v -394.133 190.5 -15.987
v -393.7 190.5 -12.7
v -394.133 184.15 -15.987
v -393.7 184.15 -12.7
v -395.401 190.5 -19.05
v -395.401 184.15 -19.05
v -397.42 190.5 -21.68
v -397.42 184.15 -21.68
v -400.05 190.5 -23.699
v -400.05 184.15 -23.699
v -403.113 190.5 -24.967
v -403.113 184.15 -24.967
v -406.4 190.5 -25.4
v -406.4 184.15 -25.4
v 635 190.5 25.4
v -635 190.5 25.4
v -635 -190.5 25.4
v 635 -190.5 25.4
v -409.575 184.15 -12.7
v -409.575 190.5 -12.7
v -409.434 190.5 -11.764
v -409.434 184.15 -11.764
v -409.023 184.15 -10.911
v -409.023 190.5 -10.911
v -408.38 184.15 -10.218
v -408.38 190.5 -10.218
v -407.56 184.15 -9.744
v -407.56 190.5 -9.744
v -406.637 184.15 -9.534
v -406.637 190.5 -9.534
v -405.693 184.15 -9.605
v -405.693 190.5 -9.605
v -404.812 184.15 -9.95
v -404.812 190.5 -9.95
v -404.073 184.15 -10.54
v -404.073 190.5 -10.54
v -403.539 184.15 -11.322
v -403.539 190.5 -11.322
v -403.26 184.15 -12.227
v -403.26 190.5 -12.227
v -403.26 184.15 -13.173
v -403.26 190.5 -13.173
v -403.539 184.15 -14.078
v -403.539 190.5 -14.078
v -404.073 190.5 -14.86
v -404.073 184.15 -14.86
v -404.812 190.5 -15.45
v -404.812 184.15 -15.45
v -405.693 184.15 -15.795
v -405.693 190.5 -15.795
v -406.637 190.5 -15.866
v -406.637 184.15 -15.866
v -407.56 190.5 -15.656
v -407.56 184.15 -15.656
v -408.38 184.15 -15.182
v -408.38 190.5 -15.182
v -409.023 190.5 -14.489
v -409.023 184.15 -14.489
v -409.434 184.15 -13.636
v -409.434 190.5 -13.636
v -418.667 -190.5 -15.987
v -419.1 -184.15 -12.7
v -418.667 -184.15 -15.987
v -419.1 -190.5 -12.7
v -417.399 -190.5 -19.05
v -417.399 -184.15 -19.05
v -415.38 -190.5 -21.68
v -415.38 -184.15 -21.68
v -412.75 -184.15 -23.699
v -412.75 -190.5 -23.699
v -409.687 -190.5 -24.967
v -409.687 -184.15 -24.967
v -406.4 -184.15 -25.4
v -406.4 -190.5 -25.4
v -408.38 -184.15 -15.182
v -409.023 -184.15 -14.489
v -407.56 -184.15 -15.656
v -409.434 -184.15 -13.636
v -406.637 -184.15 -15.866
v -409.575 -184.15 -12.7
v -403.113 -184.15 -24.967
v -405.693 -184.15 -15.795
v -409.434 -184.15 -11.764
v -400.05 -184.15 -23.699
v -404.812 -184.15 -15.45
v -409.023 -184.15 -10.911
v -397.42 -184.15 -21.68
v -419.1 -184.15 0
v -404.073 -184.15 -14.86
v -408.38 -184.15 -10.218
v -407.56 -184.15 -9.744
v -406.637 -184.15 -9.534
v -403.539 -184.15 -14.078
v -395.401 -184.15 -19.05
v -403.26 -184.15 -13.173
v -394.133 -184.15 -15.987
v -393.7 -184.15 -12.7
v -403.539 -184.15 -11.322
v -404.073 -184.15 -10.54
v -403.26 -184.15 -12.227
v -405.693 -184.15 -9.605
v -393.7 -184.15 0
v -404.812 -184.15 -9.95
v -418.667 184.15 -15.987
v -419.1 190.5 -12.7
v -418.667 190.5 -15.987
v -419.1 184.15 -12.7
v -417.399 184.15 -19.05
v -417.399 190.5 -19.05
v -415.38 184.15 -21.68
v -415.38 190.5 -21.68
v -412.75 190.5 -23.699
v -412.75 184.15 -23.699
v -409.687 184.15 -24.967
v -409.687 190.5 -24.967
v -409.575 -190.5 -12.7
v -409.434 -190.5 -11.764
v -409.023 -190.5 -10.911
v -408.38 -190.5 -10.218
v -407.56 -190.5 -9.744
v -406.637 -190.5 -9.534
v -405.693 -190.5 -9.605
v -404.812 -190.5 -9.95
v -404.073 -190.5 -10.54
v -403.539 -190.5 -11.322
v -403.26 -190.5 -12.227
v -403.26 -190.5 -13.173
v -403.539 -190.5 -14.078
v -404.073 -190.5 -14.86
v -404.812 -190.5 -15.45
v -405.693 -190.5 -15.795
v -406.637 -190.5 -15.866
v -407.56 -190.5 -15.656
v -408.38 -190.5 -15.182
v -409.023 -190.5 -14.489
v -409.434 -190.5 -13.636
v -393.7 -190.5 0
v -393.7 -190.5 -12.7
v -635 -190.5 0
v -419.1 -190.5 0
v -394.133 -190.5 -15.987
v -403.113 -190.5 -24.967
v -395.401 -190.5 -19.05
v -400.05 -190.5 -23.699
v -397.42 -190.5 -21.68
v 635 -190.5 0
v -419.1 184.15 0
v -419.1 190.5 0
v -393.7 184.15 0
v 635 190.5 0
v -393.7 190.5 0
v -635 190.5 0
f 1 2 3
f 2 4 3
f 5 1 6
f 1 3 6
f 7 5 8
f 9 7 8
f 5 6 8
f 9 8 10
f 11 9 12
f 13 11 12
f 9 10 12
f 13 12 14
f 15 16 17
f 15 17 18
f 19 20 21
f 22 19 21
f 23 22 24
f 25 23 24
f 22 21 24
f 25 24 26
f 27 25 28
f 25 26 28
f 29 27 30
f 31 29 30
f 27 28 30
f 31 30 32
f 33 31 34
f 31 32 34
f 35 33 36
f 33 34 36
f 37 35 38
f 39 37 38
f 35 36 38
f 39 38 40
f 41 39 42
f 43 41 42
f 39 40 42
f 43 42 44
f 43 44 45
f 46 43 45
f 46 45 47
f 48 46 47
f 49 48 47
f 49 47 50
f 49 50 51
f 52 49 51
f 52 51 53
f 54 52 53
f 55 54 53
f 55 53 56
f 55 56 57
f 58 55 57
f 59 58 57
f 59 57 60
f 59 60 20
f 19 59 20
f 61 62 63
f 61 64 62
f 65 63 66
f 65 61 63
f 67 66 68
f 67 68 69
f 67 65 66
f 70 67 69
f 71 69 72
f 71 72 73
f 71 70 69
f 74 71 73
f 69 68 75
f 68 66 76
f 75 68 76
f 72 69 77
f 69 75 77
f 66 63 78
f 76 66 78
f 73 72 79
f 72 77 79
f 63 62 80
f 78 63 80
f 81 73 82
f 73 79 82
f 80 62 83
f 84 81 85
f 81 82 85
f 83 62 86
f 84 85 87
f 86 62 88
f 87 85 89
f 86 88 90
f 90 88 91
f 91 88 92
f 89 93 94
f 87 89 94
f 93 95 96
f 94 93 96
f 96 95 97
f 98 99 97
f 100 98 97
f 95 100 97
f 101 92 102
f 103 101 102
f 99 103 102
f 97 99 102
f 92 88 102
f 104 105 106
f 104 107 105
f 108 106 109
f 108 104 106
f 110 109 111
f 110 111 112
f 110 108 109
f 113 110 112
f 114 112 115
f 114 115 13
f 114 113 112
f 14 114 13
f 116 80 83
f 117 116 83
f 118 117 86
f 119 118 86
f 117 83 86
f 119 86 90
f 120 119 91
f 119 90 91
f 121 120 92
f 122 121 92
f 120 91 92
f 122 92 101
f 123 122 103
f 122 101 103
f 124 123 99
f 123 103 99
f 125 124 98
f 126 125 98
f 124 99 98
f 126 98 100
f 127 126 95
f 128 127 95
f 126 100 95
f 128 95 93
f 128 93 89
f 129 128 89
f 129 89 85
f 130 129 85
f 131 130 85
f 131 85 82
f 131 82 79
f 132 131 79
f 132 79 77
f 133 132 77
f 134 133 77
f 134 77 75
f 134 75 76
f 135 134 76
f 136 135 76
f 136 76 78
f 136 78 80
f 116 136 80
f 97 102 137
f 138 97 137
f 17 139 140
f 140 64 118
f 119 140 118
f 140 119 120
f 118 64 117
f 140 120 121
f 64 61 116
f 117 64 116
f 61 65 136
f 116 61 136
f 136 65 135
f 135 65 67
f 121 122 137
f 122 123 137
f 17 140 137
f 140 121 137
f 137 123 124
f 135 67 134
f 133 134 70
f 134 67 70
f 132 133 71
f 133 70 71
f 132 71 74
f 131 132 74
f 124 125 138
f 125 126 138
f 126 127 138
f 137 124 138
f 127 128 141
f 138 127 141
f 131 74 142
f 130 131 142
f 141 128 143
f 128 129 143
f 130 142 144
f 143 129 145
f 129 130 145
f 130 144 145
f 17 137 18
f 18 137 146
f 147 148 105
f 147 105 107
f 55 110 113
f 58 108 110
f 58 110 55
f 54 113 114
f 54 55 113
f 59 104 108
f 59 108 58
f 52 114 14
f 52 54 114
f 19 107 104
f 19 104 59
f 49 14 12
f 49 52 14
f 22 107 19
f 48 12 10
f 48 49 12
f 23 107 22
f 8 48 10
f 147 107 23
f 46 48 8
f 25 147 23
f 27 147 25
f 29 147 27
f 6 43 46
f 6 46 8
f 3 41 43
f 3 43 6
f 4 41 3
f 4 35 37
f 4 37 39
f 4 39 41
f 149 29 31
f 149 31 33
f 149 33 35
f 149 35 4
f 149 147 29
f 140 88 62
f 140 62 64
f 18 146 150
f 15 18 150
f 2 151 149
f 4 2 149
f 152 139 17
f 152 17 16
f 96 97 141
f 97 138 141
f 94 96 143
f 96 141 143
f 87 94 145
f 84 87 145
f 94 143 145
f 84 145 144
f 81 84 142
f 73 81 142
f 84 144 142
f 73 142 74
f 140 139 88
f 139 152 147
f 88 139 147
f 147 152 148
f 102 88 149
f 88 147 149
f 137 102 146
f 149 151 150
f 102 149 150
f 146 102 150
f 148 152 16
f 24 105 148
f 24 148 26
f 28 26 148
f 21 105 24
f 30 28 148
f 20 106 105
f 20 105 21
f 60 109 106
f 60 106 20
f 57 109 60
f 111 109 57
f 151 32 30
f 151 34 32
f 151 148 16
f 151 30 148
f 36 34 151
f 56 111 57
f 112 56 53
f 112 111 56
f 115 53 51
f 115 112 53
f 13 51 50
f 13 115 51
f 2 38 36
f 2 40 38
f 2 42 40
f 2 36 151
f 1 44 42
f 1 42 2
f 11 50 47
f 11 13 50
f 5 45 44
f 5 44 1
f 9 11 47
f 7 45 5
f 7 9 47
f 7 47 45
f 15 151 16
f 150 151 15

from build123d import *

# Parameters (mm, degrees)
F0_W     = 1270
F0_H     = 381
F1_DEPTH = 25.4
F2_W     = 25.4
F2_H     = 6.35
F3_DEPTH = 25.4
F4_R     = 12.69999
F5_R     = 3.175
F6_DEPTH = 381.001


# Not quite as in the source:
# - a fillet or chamfer is up to 0.001 mm smaller than in the source, because OpenCascade refuses the exact size


with BuildPart() as f1:
    # F0 (on Top) → F1 (new body)
    with BuildSketch(Plane.XY):
        Rectangle(F0_W, F0_H)
    extrude(amount=F1_DEPTH)

    # F2 (on face) → F3 (join)
    with BuildSketch(Plane(origin=(0, 0, 0), x_dir=(1, 0, 0), z_dir=(0, 0, -1))):
        with Locations((-406.4, 187.325)):
            Rectangle(F2_W, F2_H)
        with Locations((-406.4, -187.325)):
            Rectangle(F2_W, F2_H)
    extrude(amount=F3_DEPTH)

    # F4 (radius 12.7 in the source; OpenCascade refuses exactly that, so slightly less here)
    f4_edges = [f1.edges().sort_by_distance(p)[0] for p in [
        (-419.1, -187.325, -25.4),
        (-393.7, -187.325, -25.4),
        (-419.1, 187.325, -25.4),
        (-393.7, 187.325, -25.4),
    ]]
    fillet(f4_edges, radius=F4_R)

    # F5 (on face) → F6 (cut, through all)
    with BuildSketch(Plane(origin=(0, 190.5, 0), x_dir=(-1, 0, 0), z_dir=(0, 1, 0))):
        with Locations((406.4, -12.7)):
            Circle(F5_R)
    extrude(amount=-F6_DEPTH, mode=Mode.SUBTRACT)


solid = f1.part
